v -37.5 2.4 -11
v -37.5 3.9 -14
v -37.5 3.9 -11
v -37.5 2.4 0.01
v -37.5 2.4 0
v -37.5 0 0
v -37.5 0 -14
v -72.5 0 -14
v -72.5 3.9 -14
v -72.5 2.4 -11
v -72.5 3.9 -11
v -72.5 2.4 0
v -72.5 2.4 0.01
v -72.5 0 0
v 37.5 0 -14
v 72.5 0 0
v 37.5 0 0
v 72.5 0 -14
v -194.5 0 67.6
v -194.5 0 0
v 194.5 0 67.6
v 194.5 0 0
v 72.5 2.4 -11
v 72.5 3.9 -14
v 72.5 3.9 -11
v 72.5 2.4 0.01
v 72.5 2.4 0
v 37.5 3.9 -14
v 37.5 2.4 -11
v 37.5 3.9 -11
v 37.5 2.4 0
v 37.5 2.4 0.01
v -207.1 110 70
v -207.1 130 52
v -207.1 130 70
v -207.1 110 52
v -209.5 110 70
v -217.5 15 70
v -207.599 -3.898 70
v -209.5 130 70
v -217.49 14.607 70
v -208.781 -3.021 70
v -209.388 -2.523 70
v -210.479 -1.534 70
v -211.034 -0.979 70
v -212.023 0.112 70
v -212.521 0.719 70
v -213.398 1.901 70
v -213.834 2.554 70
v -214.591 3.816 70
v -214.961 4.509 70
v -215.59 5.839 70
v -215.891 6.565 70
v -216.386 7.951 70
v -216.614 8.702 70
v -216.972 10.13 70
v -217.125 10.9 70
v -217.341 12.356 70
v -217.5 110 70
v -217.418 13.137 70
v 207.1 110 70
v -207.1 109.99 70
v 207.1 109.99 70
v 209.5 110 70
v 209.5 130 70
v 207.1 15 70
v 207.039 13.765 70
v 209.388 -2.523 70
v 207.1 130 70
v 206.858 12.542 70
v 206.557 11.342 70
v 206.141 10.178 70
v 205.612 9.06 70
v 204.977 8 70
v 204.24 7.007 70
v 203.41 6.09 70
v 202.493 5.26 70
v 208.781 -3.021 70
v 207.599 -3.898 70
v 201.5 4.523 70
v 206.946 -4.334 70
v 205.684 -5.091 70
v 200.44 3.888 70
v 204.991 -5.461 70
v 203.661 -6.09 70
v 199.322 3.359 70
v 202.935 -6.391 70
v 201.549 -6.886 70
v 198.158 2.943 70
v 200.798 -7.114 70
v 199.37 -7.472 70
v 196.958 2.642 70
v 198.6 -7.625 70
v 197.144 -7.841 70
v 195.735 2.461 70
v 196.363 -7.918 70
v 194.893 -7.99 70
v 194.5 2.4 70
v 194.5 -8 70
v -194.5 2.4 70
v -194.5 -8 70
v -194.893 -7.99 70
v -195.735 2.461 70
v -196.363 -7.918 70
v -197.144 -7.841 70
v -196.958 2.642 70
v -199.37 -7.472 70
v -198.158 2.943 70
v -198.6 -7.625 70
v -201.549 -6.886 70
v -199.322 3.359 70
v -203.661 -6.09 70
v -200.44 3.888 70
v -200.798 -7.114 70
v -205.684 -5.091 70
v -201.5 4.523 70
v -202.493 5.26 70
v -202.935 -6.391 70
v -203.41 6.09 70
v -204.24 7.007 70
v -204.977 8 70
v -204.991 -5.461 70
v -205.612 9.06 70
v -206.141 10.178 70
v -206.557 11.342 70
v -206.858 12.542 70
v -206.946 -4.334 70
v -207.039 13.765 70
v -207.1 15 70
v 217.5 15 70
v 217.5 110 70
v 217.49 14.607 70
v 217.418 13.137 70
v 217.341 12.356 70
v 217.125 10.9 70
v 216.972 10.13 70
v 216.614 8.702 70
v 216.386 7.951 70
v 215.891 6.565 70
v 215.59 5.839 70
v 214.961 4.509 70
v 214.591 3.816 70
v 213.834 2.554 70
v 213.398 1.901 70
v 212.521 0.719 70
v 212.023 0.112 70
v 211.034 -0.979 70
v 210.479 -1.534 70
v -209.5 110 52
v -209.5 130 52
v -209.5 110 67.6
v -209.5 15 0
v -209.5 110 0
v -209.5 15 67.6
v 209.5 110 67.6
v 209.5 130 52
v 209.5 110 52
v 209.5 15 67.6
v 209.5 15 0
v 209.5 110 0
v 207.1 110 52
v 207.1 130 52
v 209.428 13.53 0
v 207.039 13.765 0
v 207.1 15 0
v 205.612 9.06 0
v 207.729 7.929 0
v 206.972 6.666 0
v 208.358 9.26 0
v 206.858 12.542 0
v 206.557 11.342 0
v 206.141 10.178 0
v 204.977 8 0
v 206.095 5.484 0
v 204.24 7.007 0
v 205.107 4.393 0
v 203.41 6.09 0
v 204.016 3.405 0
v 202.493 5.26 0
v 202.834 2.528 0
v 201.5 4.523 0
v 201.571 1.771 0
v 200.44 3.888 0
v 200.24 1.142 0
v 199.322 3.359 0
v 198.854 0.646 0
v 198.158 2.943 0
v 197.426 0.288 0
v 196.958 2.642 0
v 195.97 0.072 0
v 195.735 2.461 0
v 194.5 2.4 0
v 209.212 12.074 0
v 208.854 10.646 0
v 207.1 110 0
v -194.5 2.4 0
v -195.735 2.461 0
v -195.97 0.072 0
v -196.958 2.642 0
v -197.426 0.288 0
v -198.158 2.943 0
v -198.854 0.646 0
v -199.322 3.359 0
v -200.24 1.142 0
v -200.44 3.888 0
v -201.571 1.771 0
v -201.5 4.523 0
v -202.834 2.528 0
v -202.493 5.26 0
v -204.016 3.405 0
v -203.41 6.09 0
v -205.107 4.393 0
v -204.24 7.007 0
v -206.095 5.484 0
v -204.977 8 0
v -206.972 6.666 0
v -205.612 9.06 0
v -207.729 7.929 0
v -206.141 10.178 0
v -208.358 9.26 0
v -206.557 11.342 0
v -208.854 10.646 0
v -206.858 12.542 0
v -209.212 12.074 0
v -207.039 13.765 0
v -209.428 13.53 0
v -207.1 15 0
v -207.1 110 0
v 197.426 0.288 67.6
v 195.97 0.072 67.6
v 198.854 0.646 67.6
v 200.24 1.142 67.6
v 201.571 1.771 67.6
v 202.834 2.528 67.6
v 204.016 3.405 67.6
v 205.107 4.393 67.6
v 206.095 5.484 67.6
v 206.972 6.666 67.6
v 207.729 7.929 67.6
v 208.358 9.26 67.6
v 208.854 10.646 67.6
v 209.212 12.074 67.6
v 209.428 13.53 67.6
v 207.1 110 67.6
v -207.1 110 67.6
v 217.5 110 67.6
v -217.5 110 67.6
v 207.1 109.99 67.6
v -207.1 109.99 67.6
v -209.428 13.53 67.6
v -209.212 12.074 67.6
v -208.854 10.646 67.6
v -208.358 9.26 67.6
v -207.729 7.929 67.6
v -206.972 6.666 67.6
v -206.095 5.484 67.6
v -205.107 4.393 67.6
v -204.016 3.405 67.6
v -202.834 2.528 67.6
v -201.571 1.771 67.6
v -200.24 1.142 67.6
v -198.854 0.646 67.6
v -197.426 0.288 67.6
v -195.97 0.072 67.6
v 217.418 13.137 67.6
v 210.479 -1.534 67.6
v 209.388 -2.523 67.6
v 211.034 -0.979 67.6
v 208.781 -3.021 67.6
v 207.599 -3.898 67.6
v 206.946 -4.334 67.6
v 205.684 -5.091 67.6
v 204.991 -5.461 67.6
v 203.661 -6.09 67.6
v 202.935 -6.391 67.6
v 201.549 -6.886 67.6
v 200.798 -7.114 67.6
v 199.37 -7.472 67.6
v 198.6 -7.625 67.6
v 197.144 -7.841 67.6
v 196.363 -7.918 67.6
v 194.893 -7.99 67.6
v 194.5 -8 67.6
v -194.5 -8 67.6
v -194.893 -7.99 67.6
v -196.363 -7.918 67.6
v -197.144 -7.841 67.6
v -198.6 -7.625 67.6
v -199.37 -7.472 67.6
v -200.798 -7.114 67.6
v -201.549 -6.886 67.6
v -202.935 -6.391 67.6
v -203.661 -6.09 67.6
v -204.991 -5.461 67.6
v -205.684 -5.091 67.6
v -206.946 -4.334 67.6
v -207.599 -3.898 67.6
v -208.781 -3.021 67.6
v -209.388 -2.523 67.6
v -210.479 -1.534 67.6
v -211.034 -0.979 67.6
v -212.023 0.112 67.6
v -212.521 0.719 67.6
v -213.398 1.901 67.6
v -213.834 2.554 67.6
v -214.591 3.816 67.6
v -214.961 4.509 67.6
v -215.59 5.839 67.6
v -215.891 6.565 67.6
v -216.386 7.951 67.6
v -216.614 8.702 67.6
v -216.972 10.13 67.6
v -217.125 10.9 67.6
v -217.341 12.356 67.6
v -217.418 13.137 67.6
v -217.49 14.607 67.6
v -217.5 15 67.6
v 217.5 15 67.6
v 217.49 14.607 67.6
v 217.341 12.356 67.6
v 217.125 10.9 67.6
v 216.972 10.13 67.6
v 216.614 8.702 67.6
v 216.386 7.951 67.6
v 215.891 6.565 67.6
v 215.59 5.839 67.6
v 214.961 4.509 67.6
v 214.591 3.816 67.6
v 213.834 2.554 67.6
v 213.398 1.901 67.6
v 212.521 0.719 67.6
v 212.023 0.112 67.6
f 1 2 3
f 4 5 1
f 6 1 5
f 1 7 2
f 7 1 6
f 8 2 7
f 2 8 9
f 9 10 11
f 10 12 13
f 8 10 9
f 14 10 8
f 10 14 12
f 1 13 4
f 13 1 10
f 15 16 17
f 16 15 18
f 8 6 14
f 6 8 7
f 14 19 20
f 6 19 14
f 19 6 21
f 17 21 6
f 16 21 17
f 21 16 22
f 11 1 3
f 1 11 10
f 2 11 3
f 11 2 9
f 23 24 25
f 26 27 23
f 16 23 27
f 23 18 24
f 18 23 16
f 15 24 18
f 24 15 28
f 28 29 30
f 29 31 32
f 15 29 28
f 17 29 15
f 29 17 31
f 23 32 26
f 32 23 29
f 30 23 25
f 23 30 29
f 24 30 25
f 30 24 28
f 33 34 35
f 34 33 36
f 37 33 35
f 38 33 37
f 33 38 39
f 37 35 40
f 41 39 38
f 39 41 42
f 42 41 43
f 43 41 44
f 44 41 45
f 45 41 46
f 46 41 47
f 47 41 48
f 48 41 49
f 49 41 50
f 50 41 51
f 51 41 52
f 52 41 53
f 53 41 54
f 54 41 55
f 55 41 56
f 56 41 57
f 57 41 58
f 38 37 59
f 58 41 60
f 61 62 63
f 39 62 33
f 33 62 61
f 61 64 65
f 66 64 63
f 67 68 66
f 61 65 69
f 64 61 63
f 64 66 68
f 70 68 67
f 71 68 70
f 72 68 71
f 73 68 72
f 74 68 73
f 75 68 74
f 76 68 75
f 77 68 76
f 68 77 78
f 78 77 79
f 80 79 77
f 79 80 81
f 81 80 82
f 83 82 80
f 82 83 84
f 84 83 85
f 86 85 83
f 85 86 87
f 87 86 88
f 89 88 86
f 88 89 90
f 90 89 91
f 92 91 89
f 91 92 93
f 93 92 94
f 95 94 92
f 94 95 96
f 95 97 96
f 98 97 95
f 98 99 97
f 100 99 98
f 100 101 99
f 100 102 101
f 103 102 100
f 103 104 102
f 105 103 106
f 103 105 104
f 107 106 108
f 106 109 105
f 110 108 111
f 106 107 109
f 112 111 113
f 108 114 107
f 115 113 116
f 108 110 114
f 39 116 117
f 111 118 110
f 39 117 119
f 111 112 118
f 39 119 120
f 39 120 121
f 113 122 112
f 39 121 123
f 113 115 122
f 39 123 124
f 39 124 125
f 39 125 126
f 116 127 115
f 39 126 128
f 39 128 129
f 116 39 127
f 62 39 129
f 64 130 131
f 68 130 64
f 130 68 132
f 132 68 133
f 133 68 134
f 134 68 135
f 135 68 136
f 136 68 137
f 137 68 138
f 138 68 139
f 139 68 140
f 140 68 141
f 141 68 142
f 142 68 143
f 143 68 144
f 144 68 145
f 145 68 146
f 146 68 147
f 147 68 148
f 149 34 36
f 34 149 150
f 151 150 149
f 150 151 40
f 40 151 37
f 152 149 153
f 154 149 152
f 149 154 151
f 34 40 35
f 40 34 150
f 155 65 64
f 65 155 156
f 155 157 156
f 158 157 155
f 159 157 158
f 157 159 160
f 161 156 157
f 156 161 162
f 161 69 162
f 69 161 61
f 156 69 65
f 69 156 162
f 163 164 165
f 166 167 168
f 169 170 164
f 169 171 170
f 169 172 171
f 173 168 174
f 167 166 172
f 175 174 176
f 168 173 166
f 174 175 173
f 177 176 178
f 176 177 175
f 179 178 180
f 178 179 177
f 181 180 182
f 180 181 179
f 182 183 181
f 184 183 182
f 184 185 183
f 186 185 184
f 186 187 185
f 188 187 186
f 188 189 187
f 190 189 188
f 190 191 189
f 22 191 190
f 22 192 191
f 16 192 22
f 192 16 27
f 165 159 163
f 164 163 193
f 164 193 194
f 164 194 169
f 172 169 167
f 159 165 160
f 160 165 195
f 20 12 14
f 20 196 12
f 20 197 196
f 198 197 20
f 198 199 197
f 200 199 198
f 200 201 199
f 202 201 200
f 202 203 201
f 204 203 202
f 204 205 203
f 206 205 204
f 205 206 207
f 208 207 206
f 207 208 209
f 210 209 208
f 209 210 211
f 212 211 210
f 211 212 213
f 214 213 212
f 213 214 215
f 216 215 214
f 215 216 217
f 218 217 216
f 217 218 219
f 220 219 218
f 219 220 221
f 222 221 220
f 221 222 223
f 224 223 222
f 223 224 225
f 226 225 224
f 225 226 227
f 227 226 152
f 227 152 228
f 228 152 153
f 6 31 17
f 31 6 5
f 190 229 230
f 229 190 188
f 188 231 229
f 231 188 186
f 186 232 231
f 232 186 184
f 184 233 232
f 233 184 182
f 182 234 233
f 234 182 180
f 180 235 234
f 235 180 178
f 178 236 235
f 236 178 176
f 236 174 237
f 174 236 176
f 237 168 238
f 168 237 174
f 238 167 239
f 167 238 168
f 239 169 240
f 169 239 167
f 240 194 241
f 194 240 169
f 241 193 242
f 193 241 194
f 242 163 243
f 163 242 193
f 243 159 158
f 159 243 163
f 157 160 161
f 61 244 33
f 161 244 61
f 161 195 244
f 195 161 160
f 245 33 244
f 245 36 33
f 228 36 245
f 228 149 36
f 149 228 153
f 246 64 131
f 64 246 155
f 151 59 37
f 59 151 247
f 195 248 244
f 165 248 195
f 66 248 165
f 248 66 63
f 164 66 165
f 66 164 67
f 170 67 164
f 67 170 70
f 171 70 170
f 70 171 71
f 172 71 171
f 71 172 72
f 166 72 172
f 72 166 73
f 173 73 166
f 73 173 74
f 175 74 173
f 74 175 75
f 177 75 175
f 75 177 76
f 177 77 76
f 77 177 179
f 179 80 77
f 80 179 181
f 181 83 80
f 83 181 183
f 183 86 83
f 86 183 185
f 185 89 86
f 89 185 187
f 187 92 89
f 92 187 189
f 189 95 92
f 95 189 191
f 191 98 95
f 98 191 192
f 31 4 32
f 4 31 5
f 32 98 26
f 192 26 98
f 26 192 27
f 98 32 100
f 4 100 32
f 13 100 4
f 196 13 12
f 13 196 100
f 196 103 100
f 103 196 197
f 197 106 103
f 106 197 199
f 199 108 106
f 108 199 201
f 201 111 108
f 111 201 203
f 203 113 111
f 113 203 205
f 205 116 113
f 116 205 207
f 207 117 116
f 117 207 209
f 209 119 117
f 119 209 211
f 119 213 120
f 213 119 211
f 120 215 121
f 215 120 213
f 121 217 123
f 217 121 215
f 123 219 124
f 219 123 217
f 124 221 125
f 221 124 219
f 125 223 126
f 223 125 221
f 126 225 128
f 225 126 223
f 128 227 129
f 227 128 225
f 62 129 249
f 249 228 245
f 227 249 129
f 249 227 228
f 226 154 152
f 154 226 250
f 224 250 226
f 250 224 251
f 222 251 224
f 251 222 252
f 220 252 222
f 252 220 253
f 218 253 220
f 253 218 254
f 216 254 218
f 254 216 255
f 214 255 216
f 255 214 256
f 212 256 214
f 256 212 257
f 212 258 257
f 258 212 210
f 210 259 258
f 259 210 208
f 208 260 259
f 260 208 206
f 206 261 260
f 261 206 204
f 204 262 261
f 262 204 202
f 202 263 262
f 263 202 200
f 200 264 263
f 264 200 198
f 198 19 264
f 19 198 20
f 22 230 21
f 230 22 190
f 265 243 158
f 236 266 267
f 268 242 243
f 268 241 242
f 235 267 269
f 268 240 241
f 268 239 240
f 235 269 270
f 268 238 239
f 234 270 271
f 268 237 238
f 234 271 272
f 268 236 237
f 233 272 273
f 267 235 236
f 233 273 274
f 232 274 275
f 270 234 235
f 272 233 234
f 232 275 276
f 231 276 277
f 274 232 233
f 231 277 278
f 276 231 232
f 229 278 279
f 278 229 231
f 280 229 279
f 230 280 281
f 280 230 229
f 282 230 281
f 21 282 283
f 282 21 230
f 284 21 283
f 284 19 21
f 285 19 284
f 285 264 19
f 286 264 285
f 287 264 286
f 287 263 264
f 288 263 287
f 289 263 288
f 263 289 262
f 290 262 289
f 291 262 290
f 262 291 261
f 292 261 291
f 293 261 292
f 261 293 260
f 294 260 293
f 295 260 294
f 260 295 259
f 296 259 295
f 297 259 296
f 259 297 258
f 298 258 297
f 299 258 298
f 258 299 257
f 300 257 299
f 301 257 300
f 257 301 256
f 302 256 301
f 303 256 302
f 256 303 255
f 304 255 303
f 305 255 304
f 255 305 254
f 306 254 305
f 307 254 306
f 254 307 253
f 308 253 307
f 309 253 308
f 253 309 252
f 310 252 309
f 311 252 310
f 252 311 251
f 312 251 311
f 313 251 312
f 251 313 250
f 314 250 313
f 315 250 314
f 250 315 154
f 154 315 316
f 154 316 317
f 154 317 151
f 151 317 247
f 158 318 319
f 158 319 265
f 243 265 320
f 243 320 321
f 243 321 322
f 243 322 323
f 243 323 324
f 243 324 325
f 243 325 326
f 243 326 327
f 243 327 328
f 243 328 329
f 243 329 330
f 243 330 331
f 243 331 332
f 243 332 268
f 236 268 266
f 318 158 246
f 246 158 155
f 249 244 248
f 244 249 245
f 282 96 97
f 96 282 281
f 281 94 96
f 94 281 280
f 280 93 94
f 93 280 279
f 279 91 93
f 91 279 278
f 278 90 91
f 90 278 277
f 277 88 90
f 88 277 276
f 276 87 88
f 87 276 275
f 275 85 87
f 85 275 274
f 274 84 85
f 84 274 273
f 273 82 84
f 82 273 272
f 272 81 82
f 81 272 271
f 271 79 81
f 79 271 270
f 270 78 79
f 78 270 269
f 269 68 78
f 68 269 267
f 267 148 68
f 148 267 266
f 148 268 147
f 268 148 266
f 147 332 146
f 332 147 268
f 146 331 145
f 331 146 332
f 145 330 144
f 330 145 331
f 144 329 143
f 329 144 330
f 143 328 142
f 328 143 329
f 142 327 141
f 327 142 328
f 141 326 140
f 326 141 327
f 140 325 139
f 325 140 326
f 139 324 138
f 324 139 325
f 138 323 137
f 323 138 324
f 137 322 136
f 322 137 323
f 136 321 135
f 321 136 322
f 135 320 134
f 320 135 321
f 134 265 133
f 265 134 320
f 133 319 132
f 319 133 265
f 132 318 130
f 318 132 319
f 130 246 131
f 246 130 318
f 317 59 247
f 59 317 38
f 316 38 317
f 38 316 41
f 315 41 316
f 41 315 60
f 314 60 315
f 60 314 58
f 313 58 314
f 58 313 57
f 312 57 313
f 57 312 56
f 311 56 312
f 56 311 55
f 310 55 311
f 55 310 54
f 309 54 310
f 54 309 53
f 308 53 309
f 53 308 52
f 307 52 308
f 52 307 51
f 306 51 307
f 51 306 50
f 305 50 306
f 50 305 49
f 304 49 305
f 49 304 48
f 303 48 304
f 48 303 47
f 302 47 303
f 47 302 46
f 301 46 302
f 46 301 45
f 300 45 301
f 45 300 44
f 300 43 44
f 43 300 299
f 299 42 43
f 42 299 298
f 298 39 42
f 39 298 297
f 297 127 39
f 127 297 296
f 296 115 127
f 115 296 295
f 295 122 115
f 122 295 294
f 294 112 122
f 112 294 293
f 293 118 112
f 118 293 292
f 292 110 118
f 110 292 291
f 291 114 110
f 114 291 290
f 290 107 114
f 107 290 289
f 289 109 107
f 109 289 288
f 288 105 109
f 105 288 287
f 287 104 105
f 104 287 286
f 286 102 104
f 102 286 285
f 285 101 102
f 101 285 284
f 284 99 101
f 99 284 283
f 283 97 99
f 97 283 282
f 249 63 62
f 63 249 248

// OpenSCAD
// ===========================================================================
//  Samsung DA97-11500A  "Assy Guard-Ref Bottle"  (RSG307 / RSG309 side-by-side)
//  3D-printable replacement for the clear door-bin fence / guard
//
//  Coordinate system (mm):
//     X = across the door (rail width), centred on 0
//     Y = depth; rail OUTER face at y = 0, legs run toward +Y (toward the door)
//     Z = up;    bottom edge of the wall at z = 0
//
//  Render one part at a time:
//     openscad -o stl/bin_guard_full.stl        -D 'part="full"'   bin_guard.scad
//     openscad -o stl/bin_guard_2pc_left.stl    -D 'part="left"'  -D segments=2 bin_guard.scad
//     openscad -o stl/bin_guard_2pc_right.stl   -D 'part="right"' -D segments=2 bin_guard.scad
//     openscad -o stl/bin_guard_3pc_left.stl    -D 'part="left"'  -D segments=3 bin_guard.scad
//     openscad -o stl/bin_guard_3pc_middle.stl  -D 'part="middle"' -D segments=3 bin_guard.scad
//     openscad -o stl/bin_guard_3pc_right.stl   -D 'part="right"' -D segments=3 bin_guard.scad
//     openscad -o stl/tab_test_coupon.stl       -D 'part="coupon"' bin_guard.scad
//  Override any dimension the same way, e.g.  -D width=520 -D tongue_len=30
// ===========================================================================

part = "full";        // [full, left, middle, right, coupon]

// ---- Main body -----------------------------------------------------------
//  "measured" = scaled from the tape-measure photos (about +/- 3 mm)
//  "ASSUMED"  = not determinable from the photos - measure before printing
width       = 419;    // measured  rail outer width            (~16-1/2 in; front-view photo)
leg         = 110;    // measured  leg length, rail outer face to leg end (~4-3/8 in)
height      = 70;     // measured  wall height                 (~2-3/4 in)
wall        = 2.4;    // assumed   wall thickness (orig ~2 mm; 2.4 = 6 x 0.4 mm lines)
corner      = 15;     // measured  outer plan-view radius of the two front corners

// ---- Top rim (outward flange) -------------------------------------------
lip         = 8;      // measured  rim width past the outer wall face
lip_thk     = 2.4;    // assumed   rim thickness

// ---- Snap tabs hanging below the front rail ------------------------------
tab_w       = 35;     // measured  tab width
tab_h       = 14;     // measured  how far the tab hangs below the wall bottom
tab_spacing = 110;    // measured  centre-to-centre distance between the two tabs
tab_nub     = 1.5;    // assumed   snap ridge depth on the tab's inner (door-side) face
tab_nub_h   = 3;      // assumed   snap ridge height

// ---- Hook tongues at the top-rear corner of each leg (hang on the liner) --
//  The photos show the break at the TOP rear corner of each leg, so the tongue
//  is modeled as an extension of the leg wall at rim height, with an optional
//  downward hook at its end to catch a ledge on the door liner.
tongue_len  = 20;     // ASSUMED   length past the leg end  - measure the liner ledge / slot
tongue_h    = 18;     // ASSUMED   tongue height
tongue_z    = height - 18; // ASSUMED  tongue bottom edge (default: flush with the top)
hook_drop   = 0;      // ASSUMED   downward hook at the tongue tip, 0 = plain tongue
hook_thk    = 2.4;    // assumed   hook thickness (along Y)
tongue_thk  = 2.4;    // assumed   tongue thickness

// ---- Splitting for small print beds (left / middle / right) ---------------
segments      = 2;    // 2 = halves (~220 mm, fits 250 mm beds); 3 = thirds (~150 mm, fits 220 mm beds)
dovetail_len  = 10;   // dovetail length along X
dovetail_neck = 28;   // dovetail height at the joint face
dovetail_tip  = 38;   // dovetail height at the tip
clearance     = 0.2;  // socket clearance (increase if the joint is too tight)

$fn = 64;
eps = 0.01;
big = 4 * width;

// ---------------------------------------------------------------------------
//  2-D helpers
// ---------------------------------------------------------------------------
// Rectangle w x l (front edge on y=0), rounded only on the two FRONT corners.
module u_outline(w, l, r) {
    hull() {
        if (r > 0) {
            translate([-w/2 + r, r]) circle(r);
            translate([ w/2 - r, r]) circle(r);
        } else {
            translate([-w/2, 0]) square([w, 1]);
        }
        translate([-w/2, l - 1]) square([w, 1]);
    }
}

// The U-shaped wall footprint: outer outline minus an inner outline that is
// open at the back (y = leg).
module u_wall_2d(w, l, r, t) {
    difference() {
        u_outline(w, l, r);
        translate([0, t]) u_outline(w - 2*t, l + 50, max(r - t, 0));
    }
}

// Outward rim footprint - a band 'lip' wide outside the outer wall face,
// squared off at the leg ends.
module u_lip_2d(w, l, r, t) {
    intersection() {
        difference() {
            offset(r = lip) u_outline(w, l, r);
            offset(delta = -eps) u_outline(w, l, r);
        }
        translate([-big/2, -big/2]) square([big, big/2 + l]);
    }
}

// ---------------------------------------------------------------------------
//  3-D body
// ---------------------------------------------------------------------------
module guard(w = width, l = leg, r = corner, spacing = tab_spacing) {
    t = wall;
    union() {
        // wall
        linear_extrude(height) u_wall_2d(w, l, r, t);

        // top rim
        translate([0, 0, height - lip_thk])
            linear_extrude(lip_thk) u_lip_2d(w, l, r, t);

        // snap tabs under the front rail (co-planar with the rail wall)
        for (sx = (spacing > 0 ? [-1, 1] : [0]))
            translate([sx * spacing/2 - tab_w/2, 0, -tab_h]) {
                cube([tab_w, t, tab_h + eps]);
                if (tab_nub > 0)
                    translate([0, t - eps, 0]) cube([tab_w, tab_nub + eps, tab_nub_h]);
            }

        // hook tongues at the rear end of each leg (co-planar with the leg wall)
        for (sx = [-1, 1])
            translate([sx * (w/2 - t/2) - tongue_thk/2, l - eps, tongue_z]) {
                cube([tongue_thk, tongue_len + eps, tongue_h]);
                if (hook_drop > 0)
                    translate([0, tongue_len + eps - hook_thk, -hook_drop])
                        cube([tongue_thk, hook_thk, hook_drop + eps]);
            }
    }
}

// ---------------------------------------------------------------------------
//  Dovetail joint (trapezoid in the XZ plane, 'wall' thick in Y, pointing +X)
// ---------------------------------------------------------------------------
module dovetail(x_cut, neck, tip, len, thk) {
    zc = height / 2;
    translate([0, thk, 0])
        rotate([90, 0, 0])
            linear_extrude(thk)
                polygon([[x_cut - eps, zc - neck/2],
                         [x_cut + len, zc - tip/2],
                         [x_cut + len, zc + tip/2],
                         [x_cut - eps, zc + neck/2]]);
}

function cut_x(i) = -width/2 + width * i / segments;   // i = 1 .. segments-1

module segment(i) {           // i = 0 .. segments-1
    x0 = (i == 0)            ? -big : cut_x(i);
    x1 = (i == segments - 1) ?  big : cut_x(i + 1);
    difference() {
        union() {
            intersection() {
                guard();
                translate([x0, -big/2, -big/2]) cube([x1 - x0, big, big]);
            }
            if (i < segments - 1)                              // tail on the right end
                dovetail(cut_x(i + 1), dovetail_neck, dovetail_tip, dovetail_len, wall);
        }
        if (i > 0)                                             // socket on the left end
            dovetail(cut_x(i), dovetail_neck + 2*clearance, dovetail_tip + 2*clearance,
                     dovetail_len + clearance, wall + 2*eps);
    }
}

// ---------------------------------------------------------------------------
//  Part selector
// ---------------------------------------------------------------------------
if (part == "full")   guard();
if (part == "left")   segment(0);
if (part == "middle") segment(1);          // only meaningful with segments = 3
if (part == "right")  segment(segments - 1);
// 60 mm of rail with ONE centred tab + 40 mm legs with tongues: print this first
if (part == "coupon") guard(w = 60 + 2*wall, l = 40, r = 0, spacing = 0);
